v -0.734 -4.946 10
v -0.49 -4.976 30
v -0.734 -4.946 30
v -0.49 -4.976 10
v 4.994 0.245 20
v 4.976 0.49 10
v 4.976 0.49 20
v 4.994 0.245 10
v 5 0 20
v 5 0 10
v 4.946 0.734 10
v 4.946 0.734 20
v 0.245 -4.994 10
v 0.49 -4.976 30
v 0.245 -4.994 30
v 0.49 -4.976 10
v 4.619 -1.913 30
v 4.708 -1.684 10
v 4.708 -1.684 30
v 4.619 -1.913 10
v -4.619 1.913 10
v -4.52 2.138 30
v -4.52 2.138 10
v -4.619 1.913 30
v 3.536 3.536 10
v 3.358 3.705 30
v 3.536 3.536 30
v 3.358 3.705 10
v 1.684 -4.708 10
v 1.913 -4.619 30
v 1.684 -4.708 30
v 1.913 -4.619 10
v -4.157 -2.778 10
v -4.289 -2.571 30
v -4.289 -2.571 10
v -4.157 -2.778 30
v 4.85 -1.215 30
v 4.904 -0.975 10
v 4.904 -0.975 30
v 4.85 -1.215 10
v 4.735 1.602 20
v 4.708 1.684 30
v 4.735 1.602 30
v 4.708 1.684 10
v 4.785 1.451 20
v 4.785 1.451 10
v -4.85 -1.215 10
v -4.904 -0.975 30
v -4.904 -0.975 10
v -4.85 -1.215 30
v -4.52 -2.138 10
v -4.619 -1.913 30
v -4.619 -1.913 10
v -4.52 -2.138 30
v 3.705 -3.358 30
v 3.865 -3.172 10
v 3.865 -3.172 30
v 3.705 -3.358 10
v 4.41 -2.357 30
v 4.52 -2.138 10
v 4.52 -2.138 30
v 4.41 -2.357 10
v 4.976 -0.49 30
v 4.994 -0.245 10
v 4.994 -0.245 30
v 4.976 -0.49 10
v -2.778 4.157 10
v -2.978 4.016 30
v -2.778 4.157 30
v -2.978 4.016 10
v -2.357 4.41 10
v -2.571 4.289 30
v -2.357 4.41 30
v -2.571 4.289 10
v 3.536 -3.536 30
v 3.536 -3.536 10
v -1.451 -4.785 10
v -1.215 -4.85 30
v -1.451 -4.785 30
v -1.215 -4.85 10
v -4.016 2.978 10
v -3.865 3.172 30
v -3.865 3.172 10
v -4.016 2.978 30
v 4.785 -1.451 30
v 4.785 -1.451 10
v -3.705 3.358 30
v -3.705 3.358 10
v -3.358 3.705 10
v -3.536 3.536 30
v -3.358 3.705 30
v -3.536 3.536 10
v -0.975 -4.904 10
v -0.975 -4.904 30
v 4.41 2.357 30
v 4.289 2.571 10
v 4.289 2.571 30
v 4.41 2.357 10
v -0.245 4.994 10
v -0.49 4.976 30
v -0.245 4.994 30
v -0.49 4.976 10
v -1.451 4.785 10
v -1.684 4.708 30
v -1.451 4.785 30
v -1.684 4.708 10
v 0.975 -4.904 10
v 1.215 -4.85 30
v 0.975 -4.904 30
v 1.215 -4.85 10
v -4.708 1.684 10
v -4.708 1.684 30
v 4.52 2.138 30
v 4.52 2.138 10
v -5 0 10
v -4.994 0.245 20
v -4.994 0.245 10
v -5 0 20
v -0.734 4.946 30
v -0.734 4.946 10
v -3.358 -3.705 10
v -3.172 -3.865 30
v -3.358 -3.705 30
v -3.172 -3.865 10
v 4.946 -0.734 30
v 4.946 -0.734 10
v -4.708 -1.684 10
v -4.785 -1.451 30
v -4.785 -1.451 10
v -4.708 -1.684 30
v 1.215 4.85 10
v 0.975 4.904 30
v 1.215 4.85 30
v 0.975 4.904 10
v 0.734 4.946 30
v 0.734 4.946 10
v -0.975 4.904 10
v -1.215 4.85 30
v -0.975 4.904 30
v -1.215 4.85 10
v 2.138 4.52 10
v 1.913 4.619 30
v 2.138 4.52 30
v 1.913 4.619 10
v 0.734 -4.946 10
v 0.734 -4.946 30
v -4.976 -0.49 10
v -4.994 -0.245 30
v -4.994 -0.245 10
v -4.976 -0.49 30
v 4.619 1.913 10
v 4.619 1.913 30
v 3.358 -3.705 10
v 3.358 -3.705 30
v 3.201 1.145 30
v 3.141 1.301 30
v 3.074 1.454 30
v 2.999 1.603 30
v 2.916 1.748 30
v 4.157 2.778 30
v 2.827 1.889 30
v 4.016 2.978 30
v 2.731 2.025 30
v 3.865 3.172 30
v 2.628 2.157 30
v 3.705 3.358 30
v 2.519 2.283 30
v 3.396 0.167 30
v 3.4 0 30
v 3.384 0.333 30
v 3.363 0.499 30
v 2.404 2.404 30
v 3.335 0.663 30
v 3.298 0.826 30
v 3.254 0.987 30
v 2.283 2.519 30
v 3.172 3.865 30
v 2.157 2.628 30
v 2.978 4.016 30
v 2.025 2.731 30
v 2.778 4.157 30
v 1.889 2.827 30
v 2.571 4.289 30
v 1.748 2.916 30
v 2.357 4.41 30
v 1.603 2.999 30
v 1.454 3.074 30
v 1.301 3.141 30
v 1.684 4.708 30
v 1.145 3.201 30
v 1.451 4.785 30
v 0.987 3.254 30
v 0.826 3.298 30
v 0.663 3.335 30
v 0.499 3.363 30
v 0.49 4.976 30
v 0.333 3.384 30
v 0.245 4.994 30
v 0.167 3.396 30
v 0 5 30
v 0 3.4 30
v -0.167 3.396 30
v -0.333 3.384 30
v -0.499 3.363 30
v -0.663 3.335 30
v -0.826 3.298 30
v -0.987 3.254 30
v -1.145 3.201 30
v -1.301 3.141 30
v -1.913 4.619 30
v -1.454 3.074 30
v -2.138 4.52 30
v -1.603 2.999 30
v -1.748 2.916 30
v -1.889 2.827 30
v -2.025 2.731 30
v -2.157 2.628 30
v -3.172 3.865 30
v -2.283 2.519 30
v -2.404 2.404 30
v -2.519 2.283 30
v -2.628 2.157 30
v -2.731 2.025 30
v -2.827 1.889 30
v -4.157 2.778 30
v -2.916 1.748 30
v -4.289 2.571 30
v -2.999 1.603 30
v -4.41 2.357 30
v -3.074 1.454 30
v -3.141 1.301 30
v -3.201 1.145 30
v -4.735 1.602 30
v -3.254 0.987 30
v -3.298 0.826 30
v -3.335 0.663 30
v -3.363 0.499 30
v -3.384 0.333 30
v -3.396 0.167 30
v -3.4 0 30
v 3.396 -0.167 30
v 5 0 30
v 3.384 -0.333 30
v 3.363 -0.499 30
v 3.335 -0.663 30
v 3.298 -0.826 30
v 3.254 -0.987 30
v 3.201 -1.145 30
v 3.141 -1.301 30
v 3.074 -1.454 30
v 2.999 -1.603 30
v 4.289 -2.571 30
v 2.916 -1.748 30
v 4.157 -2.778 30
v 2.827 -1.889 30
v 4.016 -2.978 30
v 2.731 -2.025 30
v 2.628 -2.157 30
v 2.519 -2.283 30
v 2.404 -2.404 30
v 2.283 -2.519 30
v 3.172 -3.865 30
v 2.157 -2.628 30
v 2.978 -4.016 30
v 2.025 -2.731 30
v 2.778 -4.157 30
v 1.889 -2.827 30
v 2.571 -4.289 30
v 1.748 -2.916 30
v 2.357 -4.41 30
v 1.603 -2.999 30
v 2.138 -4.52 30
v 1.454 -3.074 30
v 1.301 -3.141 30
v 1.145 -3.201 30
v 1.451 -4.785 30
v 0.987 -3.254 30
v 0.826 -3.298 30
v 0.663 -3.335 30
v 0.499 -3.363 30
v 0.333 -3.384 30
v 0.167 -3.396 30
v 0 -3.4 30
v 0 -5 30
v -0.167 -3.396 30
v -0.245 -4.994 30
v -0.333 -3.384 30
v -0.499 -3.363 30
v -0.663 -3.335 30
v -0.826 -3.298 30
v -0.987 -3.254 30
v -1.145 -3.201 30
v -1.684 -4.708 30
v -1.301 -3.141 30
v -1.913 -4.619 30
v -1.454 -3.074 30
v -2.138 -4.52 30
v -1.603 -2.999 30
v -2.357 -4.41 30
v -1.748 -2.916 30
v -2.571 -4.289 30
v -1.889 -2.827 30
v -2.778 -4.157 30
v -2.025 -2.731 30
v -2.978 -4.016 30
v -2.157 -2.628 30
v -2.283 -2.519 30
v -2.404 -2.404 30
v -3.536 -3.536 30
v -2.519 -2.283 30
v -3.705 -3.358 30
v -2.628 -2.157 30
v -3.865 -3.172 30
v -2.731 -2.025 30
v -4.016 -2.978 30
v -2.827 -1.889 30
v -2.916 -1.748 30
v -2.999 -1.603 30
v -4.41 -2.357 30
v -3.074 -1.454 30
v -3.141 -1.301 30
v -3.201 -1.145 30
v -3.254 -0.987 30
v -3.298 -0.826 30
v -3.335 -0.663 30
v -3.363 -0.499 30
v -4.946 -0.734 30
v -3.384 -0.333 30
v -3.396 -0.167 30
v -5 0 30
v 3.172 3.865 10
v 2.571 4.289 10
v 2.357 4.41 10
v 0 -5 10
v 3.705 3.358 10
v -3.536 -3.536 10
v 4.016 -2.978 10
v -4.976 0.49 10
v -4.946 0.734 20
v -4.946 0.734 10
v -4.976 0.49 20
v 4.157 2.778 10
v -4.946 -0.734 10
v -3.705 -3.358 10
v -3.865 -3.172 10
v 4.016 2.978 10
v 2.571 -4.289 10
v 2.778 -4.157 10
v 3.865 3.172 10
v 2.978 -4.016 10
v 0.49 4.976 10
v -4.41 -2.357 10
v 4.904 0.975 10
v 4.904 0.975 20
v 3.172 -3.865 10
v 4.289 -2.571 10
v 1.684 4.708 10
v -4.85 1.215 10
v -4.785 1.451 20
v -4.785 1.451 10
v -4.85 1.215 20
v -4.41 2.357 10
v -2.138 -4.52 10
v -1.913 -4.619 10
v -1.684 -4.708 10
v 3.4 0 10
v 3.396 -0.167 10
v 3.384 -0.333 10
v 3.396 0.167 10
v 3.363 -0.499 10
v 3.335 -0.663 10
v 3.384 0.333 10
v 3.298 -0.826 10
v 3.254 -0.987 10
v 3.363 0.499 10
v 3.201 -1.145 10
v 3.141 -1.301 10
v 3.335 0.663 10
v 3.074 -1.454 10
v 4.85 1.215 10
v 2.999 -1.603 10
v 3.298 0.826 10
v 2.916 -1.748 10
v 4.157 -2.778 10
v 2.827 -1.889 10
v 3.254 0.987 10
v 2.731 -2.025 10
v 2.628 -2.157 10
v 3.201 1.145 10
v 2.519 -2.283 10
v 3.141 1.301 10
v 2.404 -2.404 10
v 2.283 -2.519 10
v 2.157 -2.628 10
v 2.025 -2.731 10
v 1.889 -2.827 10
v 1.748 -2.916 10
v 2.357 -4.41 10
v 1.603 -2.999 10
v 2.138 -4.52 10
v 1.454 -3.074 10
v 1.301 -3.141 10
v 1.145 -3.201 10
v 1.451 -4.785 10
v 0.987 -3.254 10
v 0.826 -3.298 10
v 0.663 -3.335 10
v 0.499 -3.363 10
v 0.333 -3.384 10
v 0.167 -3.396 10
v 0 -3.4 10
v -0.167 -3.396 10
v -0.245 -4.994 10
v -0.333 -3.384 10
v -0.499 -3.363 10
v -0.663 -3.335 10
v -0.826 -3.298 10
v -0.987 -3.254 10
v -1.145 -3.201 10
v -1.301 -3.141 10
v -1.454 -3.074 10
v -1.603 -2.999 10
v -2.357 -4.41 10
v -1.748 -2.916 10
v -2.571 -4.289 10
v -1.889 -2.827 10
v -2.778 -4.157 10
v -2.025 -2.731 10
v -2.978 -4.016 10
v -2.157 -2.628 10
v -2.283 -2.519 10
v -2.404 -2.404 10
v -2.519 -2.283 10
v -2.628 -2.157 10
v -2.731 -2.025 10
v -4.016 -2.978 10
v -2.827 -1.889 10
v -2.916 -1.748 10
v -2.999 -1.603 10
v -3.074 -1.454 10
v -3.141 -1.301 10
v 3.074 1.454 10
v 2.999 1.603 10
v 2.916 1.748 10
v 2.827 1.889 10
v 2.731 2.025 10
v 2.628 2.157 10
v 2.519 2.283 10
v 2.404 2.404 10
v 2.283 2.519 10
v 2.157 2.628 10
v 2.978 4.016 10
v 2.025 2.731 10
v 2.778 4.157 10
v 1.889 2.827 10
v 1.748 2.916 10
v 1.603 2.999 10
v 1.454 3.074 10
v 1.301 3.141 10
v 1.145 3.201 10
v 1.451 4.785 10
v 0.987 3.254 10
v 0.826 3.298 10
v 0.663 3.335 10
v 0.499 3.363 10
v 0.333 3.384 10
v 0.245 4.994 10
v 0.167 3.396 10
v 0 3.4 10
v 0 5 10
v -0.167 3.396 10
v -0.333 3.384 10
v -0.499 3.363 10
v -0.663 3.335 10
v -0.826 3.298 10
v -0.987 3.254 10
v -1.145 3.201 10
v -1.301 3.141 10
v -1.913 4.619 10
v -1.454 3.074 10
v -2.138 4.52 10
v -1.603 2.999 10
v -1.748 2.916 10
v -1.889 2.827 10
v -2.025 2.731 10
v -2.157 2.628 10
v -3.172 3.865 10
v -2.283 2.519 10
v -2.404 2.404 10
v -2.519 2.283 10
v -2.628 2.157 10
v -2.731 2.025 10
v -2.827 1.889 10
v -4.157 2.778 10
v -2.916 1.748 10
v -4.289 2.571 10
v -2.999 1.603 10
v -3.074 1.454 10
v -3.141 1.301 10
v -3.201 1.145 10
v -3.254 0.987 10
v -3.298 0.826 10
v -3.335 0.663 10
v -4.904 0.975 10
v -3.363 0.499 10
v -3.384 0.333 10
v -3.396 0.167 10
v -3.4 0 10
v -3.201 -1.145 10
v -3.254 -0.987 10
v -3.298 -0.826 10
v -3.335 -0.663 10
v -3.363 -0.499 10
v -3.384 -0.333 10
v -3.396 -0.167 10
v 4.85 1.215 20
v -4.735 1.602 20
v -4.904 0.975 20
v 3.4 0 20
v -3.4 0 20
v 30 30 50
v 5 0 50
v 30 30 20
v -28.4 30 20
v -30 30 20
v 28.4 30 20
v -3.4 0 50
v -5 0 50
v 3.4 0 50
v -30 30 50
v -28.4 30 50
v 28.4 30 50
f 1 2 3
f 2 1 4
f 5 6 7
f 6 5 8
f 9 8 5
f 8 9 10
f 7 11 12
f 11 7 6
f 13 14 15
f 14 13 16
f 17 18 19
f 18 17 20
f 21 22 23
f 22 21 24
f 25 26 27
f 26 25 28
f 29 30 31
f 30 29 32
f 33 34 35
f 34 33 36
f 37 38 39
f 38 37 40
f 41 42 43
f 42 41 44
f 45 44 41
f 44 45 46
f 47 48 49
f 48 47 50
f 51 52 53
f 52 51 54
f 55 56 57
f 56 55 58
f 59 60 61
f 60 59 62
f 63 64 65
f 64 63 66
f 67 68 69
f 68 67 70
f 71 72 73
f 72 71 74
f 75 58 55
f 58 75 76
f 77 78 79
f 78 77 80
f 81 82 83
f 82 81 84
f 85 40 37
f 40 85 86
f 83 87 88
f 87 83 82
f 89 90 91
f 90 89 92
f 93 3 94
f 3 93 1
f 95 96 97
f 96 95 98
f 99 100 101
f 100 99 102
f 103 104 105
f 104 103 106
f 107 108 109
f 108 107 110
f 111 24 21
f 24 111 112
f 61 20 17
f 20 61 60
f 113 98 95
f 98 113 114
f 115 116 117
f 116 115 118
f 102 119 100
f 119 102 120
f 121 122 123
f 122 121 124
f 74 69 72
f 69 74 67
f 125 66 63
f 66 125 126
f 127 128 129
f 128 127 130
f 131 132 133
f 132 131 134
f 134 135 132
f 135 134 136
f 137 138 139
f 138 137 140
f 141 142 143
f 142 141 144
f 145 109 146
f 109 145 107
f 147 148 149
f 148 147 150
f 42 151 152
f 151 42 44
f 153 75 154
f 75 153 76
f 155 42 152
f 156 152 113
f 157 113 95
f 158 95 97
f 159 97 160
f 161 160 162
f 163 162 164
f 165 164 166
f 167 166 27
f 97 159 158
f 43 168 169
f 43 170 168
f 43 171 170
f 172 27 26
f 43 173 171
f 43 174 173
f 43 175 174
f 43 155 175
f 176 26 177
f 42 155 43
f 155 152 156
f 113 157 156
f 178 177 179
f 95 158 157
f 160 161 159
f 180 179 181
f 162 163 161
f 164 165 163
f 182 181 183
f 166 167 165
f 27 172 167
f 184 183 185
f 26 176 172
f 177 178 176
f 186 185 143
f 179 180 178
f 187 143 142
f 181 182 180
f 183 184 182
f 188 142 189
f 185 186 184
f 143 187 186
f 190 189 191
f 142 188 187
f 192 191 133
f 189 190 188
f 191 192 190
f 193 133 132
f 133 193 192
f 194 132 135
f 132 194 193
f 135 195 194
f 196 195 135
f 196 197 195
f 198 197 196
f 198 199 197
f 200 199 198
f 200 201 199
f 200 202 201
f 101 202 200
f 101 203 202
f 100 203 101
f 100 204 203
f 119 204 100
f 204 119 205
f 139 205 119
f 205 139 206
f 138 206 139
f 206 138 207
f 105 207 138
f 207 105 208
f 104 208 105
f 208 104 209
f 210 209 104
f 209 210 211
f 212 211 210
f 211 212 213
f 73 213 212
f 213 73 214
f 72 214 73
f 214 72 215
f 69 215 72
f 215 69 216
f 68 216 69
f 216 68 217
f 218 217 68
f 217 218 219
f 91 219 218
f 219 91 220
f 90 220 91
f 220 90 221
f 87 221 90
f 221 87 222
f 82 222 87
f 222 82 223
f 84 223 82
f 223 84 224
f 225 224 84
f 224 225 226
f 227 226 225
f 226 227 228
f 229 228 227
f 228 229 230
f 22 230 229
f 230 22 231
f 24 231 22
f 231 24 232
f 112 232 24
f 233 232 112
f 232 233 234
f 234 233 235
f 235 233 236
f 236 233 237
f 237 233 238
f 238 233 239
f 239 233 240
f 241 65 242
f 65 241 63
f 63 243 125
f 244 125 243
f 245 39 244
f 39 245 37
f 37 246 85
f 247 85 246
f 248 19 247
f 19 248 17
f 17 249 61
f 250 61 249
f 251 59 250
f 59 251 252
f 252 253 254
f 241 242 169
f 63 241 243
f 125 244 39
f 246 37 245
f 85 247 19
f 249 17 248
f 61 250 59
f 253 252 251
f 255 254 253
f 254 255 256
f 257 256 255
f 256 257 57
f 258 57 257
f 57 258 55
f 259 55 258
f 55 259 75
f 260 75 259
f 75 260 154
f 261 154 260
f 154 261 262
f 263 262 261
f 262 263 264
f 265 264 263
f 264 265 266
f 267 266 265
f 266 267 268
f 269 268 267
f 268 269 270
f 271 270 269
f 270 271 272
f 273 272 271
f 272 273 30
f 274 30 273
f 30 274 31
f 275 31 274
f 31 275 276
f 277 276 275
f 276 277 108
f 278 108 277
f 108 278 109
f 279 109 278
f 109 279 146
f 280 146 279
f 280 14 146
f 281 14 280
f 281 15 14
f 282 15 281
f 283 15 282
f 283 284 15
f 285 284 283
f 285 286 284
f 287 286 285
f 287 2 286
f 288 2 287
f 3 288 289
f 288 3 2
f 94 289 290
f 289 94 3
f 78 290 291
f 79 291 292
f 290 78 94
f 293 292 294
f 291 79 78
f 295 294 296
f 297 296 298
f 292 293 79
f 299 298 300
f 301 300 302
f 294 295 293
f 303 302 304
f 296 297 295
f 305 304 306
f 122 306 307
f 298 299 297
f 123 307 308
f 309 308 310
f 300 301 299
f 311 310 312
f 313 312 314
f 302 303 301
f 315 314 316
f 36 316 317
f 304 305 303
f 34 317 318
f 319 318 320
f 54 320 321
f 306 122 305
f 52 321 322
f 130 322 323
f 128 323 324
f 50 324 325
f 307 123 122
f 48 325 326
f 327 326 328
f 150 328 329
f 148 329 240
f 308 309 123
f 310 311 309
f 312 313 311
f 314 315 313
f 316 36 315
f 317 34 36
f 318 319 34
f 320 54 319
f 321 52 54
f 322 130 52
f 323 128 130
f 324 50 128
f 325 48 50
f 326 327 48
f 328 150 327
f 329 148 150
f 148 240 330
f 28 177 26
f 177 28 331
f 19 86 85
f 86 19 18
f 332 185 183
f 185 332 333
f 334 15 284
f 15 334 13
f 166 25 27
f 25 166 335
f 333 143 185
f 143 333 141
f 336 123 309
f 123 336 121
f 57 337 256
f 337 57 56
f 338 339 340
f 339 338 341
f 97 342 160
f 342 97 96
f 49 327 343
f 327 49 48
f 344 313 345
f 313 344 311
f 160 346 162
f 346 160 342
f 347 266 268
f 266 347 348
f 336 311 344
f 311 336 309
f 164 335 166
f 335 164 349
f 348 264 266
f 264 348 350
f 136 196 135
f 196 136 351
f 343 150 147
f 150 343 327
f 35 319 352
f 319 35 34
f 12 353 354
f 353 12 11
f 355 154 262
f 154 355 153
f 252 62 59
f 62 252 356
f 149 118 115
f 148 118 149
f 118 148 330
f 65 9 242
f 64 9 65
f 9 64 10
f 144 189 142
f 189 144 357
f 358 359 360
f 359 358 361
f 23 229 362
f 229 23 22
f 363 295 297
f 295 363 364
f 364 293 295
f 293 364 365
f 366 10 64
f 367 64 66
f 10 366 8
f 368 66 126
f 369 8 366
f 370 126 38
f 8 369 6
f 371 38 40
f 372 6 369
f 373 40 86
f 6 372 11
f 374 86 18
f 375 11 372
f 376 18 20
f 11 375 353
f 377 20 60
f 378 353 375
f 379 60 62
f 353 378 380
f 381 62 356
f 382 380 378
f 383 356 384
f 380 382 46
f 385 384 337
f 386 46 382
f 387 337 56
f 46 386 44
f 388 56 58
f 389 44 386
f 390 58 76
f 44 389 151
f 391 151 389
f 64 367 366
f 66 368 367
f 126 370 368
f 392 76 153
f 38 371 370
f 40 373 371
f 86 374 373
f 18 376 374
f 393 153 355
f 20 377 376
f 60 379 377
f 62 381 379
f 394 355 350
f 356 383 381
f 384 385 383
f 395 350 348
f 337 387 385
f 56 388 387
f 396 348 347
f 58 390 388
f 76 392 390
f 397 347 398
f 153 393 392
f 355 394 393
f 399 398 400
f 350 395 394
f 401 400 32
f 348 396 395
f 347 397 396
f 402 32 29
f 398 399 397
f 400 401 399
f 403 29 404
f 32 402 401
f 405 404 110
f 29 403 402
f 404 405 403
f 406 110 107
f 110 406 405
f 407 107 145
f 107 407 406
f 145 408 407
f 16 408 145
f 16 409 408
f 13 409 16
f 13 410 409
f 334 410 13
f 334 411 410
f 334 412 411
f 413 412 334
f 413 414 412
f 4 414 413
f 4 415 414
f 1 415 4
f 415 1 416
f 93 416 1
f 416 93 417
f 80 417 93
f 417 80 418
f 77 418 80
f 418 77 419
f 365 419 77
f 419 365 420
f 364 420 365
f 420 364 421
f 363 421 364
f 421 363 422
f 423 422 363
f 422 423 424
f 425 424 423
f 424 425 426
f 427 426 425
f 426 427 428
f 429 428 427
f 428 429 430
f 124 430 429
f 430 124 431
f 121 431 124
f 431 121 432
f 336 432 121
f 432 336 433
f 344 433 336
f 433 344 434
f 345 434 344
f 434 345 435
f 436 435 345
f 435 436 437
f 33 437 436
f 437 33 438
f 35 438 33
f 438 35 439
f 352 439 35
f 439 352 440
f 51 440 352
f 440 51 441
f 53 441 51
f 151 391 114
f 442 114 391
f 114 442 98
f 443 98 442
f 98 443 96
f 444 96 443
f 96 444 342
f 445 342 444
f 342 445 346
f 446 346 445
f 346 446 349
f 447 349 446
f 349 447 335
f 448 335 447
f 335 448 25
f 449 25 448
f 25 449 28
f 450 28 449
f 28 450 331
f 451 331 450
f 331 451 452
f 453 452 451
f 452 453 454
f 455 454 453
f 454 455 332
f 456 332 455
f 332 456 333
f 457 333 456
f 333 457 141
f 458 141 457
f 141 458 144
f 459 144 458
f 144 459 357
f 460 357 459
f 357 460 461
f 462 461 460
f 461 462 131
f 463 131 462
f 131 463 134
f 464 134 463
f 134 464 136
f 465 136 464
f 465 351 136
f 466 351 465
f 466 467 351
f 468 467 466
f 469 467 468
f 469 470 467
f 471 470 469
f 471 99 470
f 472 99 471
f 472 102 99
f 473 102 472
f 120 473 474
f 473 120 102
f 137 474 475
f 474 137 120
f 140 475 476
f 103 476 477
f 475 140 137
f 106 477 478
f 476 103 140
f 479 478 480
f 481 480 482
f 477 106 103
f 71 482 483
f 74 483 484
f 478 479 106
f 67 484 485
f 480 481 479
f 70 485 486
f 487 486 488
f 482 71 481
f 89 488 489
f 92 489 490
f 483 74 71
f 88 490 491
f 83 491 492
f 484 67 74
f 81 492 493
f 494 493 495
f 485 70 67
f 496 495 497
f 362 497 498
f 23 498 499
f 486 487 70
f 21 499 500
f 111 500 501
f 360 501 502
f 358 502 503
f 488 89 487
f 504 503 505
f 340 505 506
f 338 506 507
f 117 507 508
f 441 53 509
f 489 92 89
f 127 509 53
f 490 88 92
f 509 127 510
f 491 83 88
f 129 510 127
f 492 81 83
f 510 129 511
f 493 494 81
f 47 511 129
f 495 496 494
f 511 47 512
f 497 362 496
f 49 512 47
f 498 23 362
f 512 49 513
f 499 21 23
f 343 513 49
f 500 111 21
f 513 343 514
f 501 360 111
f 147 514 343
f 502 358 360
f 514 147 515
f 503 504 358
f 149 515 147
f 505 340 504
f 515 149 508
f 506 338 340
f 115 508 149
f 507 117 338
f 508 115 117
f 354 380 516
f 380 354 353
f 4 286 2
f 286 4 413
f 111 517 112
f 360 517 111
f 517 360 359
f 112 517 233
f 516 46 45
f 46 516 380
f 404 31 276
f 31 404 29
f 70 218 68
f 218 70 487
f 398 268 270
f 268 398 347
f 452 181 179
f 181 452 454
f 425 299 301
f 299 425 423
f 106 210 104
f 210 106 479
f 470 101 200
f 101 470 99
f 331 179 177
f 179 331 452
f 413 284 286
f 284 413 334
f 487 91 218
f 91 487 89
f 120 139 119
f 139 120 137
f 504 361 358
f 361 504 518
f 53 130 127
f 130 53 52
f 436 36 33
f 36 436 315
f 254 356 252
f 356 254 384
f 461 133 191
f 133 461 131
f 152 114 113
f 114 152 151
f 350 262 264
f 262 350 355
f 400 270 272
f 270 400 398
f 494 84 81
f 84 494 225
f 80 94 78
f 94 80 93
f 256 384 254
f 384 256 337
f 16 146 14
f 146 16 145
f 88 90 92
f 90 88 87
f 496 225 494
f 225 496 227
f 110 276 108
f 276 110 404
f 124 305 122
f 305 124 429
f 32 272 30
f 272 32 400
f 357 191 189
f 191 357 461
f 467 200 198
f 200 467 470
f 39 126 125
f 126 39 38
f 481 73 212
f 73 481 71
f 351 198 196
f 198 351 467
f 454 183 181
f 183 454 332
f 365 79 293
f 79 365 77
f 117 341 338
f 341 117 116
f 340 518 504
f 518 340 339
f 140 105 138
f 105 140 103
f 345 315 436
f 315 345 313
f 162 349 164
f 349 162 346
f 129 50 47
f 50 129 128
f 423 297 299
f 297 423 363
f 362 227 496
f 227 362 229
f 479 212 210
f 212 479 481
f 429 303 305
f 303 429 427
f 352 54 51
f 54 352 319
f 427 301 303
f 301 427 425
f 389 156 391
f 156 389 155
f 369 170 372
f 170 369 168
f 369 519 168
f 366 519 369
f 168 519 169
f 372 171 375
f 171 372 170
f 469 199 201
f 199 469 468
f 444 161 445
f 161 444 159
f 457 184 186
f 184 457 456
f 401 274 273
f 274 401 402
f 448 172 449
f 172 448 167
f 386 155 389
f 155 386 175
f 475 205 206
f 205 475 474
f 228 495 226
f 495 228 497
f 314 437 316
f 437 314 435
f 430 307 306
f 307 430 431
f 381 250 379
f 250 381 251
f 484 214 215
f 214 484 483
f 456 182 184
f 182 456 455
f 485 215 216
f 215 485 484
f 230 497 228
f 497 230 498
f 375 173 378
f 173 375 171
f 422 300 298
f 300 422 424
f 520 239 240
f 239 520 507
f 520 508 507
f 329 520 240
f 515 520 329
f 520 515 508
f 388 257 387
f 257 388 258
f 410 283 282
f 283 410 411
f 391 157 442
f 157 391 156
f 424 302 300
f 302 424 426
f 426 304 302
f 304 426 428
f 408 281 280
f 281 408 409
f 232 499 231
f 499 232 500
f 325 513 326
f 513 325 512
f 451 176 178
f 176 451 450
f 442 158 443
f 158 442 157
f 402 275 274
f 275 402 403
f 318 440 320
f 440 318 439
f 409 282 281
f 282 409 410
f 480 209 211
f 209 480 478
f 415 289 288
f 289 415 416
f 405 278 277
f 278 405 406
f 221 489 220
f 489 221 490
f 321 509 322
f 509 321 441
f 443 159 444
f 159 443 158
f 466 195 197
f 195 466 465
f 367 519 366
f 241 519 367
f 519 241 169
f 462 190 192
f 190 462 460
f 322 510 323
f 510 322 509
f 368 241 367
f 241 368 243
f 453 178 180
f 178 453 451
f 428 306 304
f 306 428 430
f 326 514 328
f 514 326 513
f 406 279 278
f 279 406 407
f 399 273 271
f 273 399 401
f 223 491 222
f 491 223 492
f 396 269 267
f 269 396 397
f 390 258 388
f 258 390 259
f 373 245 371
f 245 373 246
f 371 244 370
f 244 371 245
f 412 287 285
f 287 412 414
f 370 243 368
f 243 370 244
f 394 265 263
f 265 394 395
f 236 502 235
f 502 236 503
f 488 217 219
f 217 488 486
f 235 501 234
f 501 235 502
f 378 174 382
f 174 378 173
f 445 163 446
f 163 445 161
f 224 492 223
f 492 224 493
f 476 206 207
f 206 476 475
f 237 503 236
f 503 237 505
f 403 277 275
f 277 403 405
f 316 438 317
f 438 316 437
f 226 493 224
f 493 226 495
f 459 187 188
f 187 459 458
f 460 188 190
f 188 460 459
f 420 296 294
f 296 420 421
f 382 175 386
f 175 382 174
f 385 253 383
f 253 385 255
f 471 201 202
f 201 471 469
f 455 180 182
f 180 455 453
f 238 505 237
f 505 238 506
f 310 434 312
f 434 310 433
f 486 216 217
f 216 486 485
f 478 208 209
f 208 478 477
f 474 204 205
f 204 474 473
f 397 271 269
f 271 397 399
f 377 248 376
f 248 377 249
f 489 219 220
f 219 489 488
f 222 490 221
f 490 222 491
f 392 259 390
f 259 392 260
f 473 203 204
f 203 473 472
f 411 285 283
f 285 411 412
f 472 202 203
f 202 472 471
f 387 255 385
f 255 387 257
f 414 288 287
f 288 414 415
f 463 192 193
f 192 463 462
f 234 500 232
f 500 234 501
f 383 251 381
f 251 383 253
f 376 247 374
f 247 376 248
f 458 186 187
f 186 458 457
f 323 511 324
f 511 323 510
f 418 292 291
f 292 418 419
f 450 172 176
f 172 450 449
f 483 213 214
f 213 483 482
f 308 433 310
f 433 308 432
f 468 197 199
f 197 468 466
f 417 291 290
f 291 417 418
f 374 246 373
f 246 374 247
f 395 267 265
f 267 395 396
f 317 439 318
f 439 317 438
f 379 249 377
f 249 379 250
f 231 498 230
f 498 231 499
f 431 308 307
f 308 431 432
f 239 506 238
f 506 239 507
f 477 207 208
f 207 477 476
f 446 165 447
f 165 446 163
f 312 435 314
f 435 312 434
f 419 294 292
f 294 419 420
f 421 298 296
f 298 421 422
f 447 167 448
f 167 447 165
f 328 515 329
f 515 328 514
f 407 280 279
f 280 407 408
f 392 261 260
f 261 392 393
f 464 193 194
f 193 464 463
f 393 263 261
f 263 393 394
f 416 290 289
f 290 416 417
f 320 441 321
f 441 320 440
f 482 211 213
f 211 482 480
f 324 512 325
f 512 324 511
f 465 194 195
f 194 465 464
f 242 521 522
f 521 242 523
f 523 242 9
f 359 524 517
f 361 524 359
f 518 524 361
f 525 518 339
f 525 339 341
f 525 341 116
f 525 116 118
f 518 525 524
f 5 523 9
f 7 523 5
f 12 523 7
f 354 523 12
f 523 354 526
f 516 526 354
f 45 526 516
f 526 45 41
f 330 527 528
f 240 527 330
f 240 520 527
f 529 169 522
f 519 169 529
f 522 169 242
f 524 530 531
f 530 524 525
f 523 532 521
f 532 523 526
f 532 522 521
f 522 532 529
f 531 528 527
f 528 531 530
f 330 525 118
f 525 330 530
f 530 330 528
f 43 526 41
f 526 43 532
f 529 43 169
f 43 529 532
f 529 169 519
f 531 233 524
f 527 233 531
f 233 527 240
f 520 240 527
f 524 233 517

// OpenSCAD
// Lab Funnel Design
// Units: millimetres
// Orientation: Upright, wide opening at top, rests on XY plane at z=0.

// Dimensions
$fn = 128; // High resolution for smooth curves

// Spout (Tube)
spout_outer_diameter = 10;
spout_inner_diameter = 6.8; // 10 - 2*1.6
spout_length = 20;
spout_wall_thickness = 1.6;

// Cone (Funnel)
cone_bottom_diameter = 10; // Matches spout outer diameter
cone_top_diameter = 60;
cone_height = 30; // From z=20 to z=50

// Wall Thickness (consistent)
wall_thickness = 1.6;

// Helper function to create a hollow cylinder segment
// center: [x, y, z]
// outer_d: outer diameter
// inner_d: inner diameter
// height: height of segment
// direction: 1 for +Z, -1 for -Z
module hollow_cylinder(center, outer_d, inner_d, height, direction) {
    translate(center) {
        difference() {
            // Outer shell
            cylinder(h = height, d = outer_d, $fn = $fn);
            // Inner hole
            cylinder(h = height, d = inner_d, $fn = $fn);
        }
    }
}

// Helper function to create a hollow cone segment
// center: [x, y, z]
// bottom_d: outer diameter at bottom of cone
// top_d: outer diameter at top of cone
// height: height of cone
// direction: 1 for +Z, -1 for -Z
module hollow_cone(center, bottom_d, top_d, height, direction) {
    translate(center) {
        difference() {
            // Outer shell
            linear_extrude(height = height, center = true, convexity = 3) {
                // Outer profile
                polygon(points = [
                    [-bottom_d/2, 0],
                    [bottom_d/2, 0],
                    [top_d/2, height],
                    [-top_d/2, height]
                ]);
            }
            // Inner hole (inverted cone)
            linear_extrude(height = height, center = true, convexity = 3) {
                // Inner profile (calculated based on wall thickness)
                inner_bottom_d = bottom_d - 2 * wall_thickness;
                inner_top_d = top_d - 2 * wall_thickness;
                polygon(points = [
                    [-inner_bottom_d/2, 0],
                    [inner_bottom_d/2, 0],
                    [inner_top_d/2, height],
                    [-inner_top_d/2, height]
                ]);
            }
        }
    }
}

// Main Assembly
// The funnel rests on the XY plane at z=0.
// The spout runs from z=0 to z=20.
// The cone runs from z=20 to z=50.

translate([0, 0, 0]) {
    // 1. Spout (Tube)
    // Centered at z = spout_length / 2 to sit on z=0
    hollow_cylinder(
        center = [0, 0, spout_length / 2],
        outer_d = spout_outer_diameter,
        inner_d = spout_inner_diameter,
        height = spout_length,
        direction = 1
    );

    // 2. Cone
    // Starts at z = spout_length, ends at z = spout_length + cone_height
    hollow_cone(
        center = [0, 0, spout_length + cone_height / 2],
        bottom_d = cone_bottom_diameter,
        top_d = cone_top_diameter,
        height = cone_height,
        direction = 1
    );
}
